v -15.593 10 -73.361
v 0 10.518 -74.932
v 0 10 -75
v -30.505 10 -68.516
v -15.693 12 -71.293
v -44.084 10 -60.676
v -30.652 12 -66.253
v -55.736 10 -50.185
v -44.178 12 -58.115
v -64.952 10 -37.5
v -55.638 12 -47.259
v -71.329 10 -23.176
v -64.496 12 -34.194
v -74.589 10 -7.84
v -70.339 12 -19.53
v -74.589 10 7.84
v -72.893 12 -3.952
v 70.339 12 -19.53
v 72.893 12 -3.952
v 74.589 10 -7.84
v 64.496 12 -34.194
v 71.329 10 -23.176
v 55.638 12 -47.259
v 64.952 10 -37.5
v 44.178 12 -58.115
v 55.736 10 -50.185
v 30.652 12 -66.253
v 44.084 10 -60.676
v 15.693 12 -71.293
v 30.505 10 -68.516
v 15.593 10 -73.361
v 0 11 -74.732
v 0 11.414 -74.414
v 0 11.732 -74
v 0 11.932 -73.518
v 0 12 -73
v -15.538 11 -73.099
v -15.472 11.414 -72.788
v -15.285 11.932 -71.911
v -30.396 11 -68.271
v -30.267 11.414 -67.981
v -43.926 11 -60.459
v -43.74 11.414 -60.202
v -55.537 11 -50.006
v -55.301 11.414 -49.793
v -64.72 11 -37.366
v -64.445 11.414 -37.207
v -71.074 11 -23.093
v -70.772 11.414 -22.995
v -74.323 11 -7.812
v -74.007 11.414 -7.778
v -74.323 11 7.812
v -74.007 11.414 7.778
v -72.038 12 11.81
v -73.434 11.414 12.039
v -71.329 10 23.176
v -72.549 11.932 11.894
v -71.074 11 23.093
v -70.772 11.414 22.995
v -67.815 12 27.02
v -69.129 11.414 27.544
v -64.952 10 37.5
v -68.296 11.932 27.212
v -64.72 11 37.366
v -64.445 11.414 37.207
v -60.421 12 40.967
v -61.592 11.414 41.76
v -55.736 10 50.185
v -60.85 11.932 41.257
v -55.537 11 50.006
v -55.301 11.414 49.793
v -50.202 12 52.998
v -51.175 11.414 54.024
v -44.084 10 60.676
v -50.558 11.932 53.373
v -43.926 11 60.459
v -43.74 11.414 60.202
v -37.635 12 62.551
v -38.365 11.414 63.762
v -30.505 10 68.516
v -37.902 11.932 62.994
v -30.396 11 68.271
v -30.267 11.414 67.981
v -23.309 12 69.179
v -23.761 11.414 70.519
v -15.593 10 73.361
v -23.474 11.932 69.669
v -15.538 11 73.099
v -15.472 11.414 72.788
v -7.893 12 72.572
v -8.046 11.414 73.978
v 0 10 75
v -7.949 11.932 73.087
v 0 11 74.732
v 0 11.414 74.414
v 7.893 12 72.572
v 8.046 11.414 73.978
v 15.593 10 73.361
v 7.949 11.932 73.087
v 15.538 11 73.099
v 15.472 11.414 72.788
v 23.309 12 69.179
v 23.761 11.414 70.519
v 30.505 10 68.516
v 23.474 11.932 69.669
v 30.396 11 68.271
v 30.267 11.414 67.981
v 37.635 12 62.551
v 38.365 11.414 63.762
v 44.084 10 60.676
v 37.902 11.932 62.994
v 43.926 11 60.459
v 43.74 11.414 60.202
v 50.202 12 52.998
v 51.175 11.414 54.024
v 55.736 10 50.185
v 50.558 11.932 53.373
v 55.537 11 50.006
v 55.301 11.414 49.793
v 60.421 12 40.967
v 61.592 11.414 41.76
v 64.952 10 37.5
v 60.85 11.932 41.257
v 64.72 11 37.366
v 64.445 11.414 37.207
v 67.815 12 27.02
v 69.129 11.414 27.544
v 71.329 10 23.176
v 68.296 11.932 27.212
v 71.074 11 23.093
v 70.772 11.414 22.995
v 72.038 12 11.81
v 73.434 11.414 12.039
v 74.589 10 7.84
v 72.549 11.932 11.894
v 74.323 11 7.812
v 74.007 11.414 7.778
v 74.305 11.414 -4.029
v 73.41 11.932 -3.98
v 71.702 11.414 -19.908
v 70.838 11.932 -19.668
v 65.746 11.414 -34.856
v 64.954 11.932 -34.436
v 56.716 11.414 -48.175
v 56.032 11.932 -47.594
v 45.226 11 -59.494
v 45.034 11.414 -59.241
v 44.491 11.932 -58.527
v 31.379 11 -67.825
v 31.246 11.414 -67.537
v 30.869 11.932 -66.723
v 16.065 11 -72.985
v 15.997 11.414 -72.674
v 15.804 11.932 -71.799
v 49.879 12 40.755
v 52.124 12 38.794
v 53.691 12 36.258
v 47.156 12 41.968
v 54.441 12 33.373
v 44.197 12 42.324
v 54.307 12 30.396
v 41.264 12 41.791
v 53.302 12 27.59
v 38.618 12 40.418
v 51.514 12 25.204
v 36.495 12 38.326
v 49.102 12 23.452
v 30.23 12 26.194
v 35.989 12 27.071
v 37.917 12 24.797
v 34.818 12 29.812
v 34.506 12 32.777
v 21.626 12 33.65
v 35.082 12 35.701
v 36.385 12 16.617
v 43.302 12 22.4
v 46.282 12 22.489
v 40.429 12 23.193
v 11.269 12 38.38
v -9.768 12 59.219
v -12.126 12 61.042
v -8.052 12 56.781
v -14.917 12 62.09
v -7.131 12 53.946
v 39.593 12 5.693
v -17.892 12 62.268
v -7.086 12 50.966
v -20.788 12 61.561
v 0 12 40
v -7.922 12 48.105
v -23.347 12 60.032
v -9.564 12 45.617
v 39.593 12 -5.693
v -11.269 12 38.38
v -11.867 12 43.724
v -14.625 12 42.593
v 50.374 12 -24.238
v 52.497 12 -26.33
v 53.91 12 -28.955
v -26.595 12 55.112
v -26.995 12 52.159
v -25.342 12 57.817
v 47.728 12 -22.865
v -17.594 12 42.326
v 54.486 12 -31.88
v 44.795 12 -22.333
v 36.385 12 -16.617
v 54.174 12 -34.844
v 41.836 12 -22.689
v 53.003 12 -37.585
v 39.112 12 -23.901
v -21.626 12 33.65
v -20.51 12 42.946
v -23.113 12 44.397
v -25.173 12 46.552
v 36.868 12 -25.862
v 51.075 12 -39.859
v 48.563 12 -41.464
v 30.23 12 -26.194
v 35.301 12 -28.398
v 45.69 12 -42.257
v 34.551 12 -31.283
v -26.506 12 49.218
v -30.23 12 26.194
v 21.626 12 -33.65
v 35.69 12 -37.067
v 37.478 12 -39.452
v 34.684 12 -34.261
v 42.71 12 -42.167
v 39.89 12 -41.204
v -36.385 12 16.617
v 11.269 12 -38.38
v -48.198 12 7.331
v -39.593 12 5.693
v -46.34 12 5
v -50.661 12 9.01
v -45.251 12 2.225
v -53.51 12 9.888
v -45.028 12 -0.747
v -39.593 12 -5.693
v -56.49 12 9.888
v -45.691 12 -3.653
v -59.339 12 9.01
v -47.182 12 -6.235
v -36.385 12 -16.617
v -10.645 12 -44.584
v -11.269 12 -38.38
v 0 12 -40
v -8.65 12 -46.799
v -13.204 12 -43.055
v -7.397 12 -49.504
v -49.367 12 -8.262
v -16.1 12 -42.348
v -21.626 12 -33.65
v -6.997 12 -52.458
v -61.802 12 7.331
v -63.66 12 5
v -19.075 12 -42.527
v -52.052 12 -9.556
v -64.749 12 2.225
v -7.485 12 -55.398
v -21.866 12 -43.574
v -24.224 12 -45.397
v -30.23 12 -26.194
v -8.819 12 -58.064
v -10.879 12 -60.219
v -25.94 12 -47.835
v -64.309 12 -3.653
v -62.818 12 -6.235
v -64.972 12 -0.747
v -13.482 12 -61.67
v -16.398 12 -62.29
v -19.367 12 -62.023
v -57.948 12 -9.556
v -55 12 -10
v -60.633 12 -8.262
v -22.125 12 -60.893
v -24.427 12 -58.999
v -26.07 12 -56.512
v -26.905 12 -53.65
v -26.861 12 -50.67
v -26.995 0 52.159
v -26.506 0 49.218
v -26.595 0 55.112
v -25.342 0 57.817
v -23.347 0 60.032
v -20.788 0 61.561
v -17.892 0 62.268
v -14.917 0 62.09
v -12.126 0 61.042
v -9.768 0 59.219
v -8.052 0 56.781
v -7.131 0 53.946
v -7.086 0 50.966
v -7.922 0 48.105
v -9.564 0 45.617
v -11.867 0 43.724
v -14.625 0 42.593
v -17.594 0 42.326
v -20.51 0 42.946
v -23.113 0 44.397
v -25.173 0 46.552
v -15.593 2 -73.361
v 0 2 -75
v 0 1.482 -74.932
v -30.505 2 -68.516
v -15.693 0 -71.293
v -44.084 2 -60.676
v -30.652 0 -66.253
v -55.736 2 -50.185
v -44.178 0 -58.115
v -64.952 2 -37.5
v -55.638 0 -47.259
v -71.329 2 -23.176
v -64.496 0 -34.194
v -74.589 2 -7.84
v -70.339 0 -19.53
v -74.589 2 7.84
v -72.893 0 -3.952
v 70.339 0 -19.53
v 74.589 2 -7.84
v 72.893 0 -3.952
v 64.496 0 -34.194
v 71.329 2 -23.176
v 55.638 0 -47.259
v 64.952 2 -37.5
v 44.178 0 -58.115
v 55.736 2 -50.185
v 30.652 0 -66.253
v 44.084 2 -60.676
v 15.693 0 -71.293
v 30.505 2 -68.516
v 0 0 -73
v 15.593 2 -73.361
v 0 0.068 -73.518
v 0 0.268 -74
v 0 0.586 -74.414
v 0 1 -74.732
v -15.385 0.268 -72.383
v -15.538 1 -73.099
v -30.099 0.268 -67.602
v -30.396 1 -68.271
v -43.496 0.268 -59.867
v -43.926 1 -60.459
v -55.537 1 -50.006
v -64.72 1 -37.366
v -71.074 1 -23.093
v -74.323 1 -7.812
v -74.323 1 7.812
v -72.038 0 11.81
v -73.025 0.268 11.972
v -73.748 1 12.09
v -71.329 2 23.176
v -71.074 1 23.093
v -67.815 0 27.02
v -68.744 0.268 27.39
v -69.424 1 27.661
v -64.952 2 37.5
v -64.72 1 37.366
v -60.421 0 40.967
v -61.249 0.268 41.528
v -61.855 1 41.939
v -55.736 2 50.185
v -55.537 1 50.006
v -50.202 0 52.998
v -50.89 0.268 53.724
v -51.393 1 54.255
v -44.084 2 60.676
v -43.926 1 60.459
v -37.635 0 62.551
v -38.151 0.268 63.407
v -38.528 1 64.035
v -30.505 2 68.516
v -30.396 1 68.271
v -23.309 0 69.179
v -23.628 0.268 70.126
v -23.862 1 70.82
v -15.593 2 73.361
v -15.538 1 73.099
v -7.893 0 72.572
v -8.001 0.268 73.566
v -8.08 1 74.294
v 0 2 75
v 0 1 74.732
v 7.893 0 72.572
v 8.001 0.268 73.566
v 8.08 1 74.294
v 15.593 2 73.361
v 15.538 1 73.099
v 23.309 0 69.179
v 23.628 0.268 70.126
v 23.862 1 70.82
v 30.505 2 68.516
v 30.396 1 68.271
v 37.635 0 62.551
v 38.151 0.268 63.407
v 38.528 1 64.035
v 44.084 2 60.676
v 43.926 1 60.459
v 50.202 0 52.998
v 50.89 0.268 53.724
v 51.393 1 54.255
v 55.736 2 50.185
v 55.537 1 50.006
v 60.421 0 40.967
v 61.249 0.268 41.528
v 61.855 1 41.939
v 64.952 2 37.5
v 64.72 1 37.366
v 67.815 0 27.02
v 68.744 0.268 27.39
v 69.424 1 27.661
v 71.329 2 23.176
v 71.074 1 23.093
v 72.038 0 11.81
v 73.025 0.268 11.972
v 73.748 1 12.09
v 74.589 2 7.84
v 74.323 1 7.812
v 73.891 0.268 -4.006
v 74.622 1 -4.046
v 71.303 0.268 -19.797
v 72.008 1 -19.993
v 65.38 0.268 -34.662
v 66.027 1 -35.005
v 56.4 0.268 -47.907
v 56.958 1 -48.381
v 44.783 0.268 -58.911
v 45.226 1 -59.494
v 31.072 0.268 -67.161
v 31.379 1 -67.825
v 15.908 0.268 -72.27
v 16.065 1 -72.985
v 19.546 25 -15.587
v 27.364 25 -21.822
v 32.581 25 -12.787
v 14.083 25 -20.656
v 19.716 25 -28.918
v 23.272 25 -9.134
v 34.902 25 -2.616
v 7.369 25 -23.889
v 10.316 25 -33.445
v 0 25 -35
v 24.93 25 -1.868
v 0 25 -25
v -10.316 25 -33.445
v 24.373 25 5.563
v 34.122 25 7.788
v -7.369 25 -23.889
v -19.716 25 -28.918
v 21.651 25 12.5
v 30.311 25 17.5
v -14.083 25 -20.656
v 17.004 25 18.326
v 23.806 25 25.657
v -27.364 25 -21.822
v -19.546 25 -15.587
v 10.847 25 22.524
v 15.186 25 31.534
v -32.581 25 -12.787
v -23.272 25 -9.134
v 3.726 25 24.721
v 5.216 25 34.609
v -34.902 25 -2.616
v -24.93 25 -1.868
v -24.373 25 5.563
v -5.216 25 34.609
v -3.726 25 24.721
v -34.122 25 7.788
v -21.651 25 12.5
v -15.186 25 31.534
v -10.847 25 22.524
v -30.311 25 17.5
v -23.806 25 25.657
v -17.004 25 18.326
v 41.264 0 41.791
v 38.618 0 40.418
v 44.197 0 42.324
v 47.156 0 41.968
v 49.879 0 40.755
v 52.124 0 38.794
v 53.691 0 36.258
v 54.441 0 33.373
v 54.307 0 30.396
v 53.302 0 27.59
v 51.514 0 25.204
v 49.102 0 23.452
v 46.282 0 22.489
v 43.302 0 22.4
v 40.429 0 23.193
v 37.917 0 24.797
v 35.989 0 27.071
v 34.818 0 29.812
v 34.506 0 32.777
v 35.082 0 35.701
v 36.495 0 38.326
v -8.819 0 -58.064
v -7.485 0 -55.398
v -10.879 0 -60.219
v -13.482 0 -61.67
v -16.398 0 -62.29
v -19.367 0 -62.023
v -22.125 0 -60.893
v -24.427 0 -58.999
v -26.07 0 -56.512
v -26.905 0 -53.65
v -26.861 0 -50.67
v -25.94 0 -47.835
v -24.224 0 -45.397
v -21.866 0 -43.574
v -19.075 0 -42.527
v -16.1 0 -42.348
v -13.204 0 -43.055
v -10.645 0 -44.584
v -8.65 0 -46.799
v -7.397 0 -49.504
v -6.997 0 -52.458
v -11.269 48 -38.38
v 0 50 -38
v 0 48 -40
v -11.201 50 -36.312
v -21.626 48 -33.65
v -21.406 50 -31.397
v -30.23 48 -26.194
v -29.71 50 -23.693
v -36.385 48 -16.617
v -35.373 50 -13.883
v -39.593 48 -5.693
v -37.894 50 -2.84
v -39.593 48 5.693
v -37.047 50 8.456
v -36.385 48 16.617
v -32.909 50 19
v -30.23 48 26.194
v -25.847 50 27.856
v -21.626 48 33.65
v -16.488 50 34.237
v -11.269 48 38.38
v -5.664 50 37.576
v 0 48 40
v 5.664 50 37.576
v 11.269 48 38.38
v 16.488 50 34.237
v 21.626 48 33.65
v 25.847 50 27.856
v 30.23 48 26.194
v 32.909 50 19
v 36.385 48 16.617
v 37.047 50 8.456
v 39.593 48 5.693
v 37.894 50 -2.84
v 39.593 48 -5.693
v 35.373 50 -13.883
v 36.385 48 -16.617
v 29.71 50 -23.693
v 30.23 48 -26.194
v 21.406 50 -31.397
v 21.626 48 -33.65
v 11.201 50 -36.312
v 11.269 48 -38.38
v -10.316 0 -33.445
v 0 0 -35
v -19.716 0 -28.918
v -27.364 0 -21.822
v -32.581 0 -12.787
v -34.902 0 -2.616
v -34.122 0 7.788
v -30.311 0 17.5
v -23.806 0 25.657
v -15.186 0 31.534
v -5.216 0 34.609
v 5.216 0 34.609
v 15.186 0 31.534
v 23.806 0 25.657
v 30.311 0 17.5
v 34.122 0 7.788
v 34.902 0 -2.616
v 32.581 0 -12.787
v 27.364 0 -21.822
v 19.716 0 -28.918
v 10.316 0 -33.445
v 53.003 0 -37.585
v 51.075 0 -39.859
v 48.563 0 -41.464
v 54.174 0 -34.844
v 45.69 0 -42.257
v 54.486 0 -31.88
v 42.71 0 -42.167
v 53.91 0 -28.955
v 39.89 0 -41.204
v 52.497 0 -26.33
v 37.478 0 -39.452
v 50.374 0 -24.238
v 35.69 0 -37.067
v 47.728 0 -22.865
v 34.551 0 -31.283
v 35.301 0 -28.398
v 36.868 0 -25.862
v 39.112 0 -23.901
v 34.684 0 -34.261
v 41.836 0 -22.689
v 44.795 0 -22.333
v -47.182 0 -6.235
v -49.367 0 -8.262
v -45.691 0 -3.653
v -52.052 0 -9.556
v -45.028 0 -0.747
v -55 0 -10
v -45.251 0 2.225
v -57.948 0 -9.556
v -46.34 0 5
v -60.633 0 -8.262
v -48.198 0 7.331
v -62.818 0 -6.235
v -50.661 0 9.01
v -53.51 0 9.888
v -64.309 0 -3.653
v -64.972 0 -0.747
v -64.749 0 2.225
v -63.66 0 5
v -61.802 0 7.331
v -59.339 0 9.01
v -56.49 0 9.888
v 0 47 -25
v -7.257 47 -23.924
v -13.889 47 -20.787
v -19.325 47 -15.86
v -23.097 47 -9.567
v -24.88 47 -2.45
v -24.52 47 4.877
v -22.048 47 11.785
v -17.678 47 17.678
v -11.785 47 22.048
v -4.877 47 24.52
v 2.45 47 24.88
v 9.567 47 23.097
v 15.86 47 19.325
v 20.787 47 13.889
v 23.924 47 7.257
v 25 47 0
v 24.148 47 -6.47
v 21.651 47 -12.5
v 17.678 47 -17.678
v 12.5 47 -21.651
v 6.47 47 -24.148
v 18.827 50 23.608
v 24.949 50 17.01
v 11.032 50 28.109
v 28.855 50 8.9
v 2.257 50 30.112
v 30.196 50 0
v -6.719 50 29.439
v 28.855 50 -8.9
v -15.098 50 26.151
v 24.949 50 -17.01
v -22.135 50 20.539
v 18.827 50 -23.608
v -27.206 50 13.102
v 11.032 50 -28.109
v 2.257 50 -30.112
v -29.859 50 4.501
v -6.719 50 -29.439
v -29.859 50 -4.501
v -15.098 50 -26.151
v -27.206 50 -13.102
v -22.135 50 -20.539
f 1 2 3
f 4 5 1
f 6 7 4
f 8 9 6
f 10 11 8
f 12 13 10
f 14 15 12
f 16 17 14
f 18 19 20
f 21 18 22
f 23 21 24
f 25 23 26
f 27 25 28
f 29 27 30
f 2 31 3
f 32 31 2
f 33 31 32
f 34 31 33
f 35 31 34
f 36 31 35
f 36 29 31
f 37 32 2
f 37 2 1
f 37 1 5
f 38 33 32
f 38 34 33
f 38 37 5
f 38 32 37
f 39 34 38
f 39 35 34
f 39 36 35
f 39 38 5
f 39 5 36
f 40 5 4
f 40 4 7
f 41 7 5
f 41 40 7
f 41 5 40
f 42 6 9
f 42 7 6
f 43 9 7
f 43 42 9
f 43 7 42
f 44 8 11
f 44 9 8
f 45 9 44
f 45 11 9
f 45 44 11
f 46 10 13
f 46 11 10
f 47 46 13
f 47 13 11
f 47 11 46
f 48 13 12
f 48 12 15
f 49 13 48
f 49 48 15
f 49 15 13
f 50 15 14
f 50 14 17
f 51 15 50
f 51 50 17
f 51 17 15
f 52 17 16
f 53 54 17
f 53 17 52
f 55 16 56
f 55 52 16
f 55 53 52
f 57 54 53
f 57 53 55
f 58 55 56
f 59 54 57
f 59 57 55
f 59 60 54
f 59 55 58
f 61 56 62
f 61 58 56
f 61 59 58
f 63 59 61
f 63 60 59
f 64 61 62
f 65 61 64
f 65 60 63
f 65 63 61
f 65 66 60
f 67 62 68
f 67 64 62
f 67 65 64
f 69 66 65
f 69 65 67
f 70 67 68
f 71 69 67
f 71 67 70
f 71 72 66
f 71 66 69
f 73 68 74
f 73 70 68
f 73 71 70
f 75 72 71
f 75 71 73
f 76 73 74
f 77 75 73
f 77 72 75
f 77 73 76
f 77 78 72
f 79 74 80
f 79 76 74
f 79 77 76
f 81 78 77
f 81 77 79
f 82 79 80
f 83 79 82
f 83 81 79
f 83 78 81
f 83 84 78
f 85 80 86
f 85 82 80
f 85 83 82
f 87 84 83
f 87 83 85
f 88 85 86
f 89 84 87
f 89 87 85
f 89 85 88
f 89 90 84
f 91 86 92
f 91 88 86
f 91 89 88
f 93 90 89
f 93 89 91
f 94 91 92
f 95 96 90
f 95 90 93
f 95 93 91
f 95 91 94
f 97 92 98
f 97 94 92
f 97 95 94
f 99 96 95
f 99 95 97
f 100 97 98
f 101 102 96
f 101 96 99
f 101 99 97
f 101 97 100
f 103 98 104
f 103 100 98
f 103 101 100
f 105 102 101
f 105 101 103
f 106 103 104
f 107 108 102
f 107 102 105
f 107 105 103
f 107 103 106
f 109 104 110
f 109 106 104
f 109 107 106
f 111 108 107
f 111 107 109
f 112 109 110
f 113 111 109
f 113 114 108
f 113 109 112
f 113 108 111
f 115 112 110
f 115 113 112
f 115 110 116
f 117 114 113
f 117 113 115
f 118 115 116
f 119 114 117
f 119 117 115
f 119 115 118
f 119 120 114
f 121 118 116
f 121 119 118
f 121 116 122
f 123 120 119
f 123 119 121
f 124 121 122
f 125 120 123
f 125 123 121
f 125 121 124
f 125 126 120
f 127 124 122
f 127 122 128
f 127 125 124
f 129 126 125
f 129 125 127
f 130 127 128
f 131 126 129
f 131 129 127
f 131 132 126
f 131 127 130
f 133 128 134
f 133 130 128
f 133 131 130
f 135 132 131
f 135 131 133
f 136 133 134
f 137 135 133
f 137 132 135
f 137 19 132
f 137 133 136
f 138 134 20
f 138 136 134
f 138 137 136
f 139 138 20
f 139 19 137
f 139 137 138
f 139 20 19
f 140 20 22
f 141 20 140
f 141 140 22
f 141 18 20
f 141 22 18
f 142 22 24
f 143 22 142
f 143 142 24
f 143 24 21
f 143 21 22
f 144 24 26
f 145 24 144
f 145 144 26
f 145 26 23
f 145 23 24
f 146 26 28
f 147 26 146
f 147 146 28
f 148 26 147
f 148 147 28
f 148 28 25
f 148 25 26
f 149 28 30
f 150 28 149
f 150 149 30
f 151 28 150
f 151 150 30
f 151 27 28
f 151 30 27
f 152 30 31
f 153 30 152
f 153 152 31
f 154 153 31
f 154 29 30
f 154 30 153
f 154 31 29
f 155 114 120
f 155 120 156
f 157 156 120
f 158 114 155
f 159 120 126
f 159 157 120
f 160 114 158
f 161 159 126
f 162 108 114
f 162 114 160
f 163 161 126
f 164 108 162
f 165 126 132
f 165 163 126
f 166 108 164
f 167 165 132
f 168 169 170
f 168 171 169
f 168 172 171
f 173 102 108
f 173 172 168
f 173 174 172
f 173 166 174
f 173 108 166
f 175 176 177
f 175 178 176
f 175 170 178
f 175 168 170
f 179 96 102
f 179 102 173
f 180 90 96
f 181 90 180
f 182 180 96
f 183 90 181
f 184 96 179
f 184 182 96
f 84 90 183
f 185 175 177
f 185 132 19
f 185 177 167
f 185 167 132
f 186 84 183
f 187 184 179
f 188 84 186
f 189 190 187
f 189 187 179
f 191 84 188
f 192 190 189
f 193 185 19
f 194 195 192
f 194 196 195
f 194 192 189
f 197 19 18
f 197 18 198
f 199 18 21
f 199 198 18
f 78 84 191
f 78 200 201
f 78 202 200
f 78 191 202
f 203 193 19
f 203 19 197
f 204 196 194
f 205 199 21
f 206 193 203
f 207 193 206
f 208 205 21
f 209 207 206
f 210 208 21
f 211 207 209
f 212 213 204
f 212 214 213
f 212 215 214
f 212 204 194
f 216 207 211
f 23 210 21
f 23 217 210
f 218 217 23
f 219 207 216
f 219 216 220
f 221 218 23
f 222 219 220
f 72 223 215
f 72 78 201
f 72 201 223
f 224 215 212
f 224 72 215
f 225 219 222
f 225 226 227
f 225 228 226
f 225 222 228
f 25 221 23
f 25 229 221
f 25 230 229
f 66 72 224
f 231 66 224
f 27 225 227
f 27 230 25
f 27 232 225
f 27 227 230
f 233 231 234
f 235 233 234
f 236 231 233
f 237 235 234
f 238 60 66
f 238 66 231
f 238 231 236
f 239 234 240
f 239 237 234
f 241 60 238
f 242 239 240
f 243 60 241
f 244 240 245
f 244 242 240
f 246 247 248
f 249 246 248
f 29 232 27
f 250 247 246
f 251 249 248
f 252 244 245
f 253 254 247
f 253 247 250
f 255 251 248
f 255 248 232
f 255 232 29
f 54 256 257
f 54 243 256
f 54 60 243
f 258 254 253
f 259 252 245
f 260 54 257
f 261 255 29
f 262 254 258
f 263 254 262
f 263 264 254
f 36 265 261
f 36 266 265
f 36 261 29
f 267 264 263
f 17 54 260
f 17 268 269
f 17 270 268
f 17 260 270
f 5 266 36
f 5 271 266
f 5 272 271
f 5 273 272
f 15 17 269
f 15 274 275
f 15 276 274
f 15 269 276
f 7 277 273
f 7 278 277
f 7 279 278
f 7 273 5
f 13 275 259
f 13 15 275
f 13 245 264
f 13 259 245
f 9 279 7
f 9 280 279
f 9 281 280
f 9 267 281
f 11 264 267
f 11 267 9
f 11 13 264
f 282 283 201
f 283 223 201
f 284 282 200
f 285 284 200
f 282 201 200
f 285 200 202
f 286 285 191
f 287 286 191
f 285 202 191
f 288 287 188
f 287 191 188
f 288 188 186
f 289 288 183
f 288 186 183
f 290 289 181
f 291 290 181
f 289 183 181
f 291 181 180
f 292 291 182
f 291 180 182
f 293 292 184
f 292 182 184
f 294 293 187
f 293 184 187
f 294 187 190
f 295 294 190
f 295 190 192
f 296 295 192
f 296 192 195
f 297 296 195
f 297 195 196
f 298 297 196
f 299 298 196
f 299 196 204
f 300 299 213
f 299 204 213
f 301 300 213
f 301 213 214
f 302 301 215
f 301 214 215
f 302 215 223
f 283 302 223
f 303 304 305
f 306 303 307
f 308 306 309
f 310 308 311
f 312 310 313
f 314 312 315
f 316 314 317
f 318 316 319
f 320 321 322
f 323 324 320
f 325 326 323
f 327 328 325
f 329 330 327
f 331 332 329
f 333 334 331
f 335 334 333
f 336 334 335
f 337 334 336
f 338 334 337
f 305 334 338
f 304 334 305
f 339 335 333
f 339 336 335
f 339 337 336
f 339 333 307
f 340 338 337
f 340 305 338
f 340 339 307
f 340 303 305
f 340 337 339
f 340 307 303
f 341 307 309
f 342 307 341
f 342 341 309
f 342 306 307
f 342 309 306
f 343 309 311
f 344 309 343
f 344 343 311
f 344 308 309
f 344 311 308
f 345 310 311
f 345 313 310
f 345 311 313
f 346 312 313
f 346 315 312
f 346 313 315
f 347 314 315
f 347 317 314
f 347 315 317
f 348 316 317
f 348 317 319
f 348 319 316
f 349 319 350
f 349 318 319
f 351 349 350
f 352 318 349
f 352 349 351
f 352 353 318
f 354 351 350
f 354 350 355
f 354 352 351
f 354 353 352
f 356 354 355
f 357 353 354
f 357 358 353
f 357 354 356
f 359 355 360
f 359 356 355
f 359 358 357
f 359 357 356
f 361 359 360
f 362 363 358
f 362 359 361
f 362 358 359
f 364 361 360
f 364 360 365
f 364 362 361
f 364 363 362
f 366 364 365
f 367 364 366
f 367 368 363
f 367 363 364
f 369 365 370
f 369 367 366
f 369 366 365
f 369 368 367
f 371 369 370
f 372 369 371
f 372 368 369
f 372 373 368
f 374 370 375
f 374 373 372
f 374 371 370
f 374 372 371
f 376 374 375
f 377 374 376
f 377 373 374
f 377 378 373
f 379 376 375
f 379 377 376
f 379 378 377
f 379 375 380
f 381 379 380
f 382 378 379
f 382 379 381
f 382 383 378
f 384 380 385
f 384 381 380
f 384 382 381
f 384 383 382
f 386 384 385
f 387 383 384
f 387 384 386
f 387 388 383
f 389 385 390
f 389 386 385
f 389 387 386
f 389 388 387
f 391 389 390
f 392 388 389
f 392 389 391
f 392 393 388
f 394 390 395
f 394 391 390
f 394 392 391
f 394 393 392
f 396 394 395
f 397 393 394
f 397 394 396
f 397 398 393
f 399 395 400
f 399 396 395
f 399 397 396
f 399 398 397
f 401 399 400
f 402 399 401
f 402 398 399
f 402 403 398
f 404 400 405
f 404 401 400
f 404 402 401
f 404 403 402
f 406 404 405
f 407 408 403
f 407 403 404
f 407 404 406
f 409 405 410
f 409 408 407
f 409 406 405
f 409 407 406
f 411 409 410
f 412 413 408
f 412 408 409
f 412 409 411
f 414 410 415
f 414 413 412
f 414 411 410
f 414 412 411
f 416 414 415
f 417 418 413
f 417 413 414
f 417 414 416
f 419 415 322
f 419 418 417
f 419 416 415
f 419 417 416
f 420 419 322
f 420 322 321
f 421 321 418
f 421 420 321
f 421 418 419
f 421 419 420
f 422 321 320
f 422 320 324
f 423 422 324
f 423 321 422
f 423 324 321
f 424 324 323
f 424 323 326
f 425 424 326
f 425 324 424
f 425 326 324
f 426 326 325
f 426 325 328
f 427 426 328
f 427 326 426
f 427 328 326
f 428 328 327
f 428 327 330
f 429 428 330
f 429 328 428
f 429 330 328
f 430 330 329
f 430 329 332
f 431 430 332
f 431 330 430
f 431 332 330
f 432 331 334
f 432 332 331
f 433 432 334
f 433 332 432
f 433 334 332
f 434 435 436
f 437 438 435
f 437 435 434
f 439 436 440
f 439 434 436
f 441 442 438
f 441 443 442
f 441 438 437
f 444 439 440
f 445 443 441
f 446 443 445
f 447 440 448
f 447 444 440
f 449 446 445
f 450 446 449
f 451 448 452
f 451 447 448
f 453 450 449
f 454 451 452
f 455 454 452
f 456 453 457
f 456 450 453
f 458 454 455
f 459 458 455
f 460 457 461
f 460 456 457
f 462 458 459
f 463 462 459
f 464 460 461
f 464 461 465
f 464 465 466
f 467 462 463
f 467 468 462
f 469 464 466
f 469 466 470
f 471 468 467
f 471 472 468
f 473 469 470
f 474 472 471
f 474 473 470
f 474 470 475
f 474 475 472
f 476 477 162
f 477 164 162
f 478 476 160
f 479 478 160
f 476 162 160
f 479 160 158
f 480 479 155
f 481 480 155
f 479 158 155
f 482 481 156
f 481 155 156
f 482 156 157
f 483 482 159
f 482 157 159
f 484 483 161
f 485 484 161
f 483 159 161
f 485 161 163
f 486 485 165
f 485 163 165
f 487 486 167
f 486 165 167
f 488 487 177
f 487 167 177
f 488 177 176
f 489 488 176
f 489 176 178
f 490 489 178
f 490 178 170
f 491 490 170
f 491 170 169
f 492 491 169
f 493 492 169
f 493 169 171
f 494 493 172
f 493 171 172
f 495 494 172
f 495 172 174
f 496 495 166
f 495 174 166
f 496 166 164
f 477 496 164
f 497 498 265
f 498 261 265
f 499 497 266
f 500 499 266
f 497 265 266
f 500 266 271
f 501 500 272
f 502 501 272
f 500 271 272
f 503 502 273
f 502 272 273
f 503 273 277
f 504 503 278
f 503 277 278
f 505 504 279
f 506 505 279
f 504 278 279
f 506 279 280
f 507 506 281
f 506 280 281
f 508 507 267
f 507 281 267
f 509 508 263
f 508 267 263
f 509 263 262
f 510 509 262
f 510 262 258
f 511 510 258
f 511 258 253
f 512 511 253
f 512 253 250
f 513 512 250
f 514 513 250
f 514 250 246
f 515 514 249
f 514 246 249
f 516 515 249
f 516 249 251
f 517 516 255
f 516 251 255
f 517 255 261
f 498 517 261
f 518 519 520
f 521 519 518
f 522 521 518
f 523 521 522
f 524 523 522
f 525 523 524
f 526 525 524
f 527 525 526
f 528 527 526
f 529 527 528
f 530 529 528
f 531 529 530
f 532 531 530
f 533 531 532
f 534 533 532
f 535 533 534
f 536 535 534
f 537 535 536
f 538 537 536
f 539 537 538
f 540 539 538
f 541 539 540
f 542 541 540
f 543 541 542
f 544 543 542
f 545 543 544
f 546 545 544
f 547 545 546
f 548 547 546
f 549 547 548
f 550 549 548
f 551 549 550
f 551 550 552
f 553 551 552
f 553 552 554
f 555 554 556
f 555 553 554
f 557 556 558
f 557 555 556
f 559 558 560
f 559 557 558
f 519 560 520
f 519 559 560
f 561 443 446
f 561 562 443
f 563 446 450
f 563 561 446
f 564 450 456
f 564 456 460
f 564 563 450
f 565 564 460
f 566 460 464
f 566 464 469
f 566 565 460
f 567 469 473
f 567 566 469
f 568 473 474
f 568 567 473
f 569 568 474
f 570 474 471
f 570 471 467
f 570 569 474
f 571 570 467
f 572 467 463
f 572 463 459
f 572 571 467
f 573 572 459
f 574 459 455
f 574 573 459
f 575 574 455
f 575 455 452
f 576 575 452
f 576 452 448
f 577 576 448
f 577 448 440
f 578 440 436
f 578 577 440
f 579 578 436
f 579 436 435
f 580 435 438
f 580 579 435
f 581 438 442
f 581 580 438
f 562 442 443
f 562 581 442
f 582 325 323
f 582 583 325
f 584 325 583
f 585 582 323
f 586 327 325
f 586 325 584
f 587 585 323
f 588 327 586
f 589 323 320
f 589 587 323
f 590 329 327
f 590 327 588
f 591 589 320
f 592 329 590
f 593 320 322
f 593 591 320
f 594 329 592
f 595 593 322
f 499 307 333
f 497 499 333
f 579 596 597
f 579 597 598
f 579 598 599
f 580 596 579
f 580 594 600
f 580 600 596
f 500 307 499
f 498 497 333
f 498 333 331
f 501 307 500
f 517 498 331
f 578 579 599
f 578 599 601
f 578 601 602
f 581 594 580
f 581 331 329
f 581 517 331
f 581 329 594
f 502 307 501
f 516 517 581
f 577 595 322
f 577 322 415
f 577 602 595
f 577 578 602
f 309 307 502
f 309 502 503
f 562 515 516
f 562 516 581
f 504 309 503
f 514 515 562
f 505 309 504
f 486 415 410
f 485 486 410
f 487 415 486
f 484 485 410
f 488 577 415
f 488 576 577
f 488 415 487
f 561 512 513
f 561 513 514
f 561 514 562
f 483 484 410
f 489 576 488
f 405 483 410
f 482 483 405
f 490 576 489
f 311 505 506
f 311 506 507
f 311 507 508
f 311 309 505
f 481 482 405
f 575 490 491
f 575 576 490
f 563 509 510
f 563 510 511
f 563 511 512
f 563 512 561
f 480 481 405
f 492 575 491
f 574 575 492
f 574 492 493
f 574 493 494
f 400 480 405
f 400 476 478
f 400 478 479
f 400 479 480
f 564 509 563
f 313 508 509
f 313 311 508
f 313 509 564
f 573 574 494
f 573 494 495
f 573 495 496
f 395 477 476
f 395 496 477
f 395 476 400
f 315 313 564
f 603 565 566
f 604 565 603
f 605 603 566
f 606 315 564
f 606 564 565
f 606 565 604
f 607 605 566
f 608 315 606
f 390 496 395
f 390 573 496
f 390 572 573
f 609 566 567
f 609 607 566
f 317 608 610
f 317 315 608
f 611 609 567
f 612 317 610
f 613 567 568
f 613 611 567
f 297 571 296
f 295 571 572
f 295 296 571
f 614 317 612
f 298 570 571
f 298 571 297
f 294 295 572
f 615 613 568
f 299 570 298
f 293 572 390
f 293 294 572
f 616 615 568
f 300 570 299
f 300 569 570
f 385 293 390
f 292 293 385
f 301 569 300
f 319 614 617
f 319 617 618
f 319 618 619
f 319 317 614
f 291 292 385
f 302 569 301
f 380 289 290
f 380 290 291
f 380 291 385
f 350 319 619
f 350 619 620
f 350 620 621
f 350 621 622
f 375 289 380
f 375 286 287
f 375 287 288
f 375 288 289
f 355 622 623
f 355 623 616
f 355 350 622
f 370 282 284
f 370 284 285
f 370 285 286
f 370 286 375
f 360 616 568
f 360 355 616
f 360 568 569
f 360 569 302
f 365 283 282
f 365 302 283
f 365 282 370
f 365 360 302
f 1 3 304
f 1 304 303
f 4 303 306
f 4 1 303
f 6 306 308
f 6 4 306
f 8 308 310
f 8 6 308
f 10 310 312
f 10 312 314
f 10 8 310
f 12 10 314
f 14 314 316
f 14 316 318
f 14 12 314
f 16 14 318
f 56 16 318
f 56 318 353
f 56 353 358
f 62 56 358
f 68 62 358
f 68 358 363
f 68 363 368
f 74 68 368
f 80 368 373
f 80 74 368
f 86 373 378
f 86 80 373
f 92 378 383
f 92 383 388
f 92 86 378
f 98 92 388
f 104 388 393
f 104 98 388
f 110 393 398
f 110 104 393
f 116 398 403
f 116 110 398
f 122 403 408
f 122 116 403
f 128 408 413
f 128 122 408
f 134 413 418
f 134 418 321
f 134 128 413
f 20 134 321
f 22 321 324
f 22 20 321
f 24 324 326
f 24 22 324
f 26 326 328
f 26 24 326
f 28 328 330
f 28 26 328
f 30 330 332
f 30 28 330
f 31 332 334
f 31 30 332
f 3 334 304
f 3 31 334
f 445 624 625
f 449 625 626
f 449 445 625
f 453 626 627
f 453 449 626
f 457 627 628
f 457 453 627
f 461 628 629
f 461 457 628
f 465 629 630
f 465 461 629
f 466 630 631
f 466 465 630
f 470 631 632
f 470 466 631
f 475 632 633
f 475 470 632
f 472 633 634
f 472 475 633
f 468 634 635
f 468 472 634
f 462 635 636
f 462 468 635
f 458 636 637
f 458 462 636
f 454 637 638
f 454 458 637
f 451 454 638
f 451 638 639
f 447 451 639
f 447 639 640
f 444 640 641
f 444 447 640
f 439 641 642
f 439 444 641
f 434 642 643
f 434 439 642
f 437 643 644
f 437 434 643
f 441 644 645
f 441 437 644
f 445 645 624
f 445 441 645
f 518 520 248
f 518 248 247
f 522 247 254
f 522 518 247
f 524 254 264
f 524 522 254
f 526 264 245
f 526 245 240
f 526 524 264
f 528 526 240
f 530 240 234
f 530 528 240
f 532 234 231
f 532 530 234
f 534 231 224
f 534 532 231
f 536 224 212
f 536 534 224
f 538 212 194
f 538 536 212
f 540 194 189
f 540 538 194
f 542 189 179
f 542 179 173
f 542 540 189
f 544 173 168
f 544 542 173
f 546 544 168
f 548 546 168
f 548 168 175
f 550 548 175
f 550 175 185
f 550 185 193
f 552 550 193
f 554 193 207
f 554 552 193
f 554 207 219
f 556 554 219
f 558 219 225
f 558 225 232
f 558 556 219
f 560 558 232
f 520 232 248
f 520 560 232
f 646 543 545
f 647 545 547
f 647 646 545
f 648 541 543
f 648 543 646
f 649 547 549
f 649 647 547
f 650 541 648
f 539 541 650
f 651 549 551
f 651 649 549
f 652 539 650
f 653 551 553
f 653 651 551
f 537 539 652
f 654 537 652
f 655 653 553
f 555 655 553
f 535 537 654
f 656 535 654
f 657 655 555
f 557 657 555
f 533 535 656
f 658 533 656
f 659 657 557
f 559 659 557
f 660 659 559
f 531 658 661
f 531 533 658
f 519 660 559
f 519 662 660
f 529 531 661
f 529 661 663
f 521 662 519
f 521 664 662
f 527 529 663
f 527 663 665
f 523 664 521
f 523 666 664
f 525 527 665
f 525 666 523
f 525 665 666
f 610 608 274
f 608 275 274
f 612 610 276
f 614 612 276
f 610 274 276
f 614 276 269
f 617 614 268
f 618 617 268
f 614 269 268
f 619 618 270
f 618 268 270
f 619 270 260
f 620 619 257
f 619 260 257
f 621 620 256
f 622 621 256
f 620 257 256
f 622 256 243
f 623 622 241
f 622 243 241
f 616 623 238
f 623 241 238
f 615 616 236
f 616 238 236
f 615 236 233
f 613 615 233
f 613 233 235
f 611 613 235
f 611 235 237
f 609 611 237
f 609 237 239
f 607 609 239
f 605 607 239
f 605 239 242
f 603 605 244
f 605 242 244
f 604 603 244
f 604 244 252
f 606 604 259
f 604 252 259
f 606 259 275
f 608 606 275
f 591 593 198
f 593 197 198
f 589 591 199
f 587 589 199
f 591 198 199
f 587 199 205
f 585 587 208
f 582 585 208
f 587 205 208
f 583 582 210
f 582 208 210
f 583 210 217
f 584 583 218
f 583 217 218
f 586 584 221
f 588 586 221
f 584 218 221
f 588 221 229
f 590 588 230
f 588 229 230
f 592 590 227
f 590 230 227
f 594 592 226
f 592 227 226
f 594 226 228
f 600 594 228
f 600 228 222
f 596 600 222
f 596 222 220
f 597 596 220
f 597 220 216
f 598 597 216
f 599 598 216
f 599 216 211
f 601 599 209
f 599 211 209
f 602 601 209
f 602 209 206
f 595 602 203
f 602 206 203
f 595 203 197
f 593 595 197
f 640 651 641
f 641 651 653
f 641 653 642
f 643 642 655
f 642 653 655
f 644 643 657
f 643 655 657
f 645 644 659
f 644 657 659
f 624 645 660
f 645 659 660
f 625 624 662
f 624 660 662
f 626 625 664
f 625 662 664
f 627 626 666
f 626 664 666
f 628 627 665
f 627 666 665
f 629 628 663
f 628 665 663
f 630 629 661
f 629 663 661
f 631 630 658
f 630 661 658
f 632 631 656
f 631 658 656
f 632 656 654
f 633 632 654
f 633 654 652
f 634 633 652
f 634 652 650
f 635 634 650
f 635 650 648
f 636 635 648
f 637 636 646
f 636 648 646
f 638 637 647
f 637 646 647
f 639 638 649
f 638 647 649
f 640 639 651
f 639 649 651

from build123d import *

# Parameters (mm, degrees)
SKETCH_2_W               = 10
SKETCH_2_H               = 12
PATTERN_CIRCULAR_1_COUNT = 5
FILLET_1_R               = 2
CHAMFER_1_SIZE           = 2


with BuildPart() as part:
    # Эскиз1 → Повернуть1 (revolve)
    with BuildSketch(Plane.XY, mode=Mode.PRIVATE) as revolve_1_sk:
        Polygon((35, 0), (75, 0), (75, 12), (40, 12), (40, 50), (25, 50), (25, 25), (35, 25), align=None)
    revolve(revolve_1_sk.sketch.rotate(Axis((0, 0, 0), (0, 1, 0)), 90), axis=Axis((0, 0, 0), (0, 1, 0)))

    # Эскиз2 → Вырез-Повернуть1 (revolve, cut)
    with BuildSketch(Plane.XY, mode=Mode.PRIVATE) as cut_revolve_1_sk:
        with Locations((-60, 6)):
            Rectangle(SKETCH_2_W, SKETCH_2_H)
    cut_revolve_1 = revolve(cut_revolve_1_sk.sketch.rotate(Axis((-55, -2.976144308, 0), (0, 1, 0)), 270), axis=Axis((-55, -2.976144308, 0), (0, 1, 0)), mode=Mode.SUBTRACT)

    # Круговой массив1: Вырез-Повернуть1 ×5 about axis
    pattern_circular_1_axis = Axis((0, 0, 0), (0, 1, 0))
    for i in range(1, PATTERN_CIRCULAR_1_COUNT):
        add(cut_revolve_1.rotate(pattern_circular_1_axis, i * 360 / PATTERN_CIRCULAR_1_COUNT), mode=Mode.SUBTRACT)

    # Скругление1
    fillet_1_edges = [part.edges().sort_by_distance(p)[0] for p in [
        (0, 12, 75),
        (0, 0, 75),
    ]]
    fillet(fillet_1_edges, radius=FILLET_1_R)

    # Фаска1
    chamfer_1_edges = [part.edges().sort_by_distance(p)[0] for p in [
        (0, 50, 40),
    ]]
    chamfer(chamfer_1_edges, length=CHAMFER_1_SIZE)

    # Фаска2: read off the stored shape, not the designer's step
    # Фаска2 outline → Фаска2 (revolve, cut)
    with BuildSketch(Plane.XY):
        Polygon((25, 50), (25, 47), (30.196152423, 50), align=None)
    revolve(axis=Axis((0, 0, 0), (0, 1, 0)), mode=Mode.SUBTRACT)


solid = part.part
